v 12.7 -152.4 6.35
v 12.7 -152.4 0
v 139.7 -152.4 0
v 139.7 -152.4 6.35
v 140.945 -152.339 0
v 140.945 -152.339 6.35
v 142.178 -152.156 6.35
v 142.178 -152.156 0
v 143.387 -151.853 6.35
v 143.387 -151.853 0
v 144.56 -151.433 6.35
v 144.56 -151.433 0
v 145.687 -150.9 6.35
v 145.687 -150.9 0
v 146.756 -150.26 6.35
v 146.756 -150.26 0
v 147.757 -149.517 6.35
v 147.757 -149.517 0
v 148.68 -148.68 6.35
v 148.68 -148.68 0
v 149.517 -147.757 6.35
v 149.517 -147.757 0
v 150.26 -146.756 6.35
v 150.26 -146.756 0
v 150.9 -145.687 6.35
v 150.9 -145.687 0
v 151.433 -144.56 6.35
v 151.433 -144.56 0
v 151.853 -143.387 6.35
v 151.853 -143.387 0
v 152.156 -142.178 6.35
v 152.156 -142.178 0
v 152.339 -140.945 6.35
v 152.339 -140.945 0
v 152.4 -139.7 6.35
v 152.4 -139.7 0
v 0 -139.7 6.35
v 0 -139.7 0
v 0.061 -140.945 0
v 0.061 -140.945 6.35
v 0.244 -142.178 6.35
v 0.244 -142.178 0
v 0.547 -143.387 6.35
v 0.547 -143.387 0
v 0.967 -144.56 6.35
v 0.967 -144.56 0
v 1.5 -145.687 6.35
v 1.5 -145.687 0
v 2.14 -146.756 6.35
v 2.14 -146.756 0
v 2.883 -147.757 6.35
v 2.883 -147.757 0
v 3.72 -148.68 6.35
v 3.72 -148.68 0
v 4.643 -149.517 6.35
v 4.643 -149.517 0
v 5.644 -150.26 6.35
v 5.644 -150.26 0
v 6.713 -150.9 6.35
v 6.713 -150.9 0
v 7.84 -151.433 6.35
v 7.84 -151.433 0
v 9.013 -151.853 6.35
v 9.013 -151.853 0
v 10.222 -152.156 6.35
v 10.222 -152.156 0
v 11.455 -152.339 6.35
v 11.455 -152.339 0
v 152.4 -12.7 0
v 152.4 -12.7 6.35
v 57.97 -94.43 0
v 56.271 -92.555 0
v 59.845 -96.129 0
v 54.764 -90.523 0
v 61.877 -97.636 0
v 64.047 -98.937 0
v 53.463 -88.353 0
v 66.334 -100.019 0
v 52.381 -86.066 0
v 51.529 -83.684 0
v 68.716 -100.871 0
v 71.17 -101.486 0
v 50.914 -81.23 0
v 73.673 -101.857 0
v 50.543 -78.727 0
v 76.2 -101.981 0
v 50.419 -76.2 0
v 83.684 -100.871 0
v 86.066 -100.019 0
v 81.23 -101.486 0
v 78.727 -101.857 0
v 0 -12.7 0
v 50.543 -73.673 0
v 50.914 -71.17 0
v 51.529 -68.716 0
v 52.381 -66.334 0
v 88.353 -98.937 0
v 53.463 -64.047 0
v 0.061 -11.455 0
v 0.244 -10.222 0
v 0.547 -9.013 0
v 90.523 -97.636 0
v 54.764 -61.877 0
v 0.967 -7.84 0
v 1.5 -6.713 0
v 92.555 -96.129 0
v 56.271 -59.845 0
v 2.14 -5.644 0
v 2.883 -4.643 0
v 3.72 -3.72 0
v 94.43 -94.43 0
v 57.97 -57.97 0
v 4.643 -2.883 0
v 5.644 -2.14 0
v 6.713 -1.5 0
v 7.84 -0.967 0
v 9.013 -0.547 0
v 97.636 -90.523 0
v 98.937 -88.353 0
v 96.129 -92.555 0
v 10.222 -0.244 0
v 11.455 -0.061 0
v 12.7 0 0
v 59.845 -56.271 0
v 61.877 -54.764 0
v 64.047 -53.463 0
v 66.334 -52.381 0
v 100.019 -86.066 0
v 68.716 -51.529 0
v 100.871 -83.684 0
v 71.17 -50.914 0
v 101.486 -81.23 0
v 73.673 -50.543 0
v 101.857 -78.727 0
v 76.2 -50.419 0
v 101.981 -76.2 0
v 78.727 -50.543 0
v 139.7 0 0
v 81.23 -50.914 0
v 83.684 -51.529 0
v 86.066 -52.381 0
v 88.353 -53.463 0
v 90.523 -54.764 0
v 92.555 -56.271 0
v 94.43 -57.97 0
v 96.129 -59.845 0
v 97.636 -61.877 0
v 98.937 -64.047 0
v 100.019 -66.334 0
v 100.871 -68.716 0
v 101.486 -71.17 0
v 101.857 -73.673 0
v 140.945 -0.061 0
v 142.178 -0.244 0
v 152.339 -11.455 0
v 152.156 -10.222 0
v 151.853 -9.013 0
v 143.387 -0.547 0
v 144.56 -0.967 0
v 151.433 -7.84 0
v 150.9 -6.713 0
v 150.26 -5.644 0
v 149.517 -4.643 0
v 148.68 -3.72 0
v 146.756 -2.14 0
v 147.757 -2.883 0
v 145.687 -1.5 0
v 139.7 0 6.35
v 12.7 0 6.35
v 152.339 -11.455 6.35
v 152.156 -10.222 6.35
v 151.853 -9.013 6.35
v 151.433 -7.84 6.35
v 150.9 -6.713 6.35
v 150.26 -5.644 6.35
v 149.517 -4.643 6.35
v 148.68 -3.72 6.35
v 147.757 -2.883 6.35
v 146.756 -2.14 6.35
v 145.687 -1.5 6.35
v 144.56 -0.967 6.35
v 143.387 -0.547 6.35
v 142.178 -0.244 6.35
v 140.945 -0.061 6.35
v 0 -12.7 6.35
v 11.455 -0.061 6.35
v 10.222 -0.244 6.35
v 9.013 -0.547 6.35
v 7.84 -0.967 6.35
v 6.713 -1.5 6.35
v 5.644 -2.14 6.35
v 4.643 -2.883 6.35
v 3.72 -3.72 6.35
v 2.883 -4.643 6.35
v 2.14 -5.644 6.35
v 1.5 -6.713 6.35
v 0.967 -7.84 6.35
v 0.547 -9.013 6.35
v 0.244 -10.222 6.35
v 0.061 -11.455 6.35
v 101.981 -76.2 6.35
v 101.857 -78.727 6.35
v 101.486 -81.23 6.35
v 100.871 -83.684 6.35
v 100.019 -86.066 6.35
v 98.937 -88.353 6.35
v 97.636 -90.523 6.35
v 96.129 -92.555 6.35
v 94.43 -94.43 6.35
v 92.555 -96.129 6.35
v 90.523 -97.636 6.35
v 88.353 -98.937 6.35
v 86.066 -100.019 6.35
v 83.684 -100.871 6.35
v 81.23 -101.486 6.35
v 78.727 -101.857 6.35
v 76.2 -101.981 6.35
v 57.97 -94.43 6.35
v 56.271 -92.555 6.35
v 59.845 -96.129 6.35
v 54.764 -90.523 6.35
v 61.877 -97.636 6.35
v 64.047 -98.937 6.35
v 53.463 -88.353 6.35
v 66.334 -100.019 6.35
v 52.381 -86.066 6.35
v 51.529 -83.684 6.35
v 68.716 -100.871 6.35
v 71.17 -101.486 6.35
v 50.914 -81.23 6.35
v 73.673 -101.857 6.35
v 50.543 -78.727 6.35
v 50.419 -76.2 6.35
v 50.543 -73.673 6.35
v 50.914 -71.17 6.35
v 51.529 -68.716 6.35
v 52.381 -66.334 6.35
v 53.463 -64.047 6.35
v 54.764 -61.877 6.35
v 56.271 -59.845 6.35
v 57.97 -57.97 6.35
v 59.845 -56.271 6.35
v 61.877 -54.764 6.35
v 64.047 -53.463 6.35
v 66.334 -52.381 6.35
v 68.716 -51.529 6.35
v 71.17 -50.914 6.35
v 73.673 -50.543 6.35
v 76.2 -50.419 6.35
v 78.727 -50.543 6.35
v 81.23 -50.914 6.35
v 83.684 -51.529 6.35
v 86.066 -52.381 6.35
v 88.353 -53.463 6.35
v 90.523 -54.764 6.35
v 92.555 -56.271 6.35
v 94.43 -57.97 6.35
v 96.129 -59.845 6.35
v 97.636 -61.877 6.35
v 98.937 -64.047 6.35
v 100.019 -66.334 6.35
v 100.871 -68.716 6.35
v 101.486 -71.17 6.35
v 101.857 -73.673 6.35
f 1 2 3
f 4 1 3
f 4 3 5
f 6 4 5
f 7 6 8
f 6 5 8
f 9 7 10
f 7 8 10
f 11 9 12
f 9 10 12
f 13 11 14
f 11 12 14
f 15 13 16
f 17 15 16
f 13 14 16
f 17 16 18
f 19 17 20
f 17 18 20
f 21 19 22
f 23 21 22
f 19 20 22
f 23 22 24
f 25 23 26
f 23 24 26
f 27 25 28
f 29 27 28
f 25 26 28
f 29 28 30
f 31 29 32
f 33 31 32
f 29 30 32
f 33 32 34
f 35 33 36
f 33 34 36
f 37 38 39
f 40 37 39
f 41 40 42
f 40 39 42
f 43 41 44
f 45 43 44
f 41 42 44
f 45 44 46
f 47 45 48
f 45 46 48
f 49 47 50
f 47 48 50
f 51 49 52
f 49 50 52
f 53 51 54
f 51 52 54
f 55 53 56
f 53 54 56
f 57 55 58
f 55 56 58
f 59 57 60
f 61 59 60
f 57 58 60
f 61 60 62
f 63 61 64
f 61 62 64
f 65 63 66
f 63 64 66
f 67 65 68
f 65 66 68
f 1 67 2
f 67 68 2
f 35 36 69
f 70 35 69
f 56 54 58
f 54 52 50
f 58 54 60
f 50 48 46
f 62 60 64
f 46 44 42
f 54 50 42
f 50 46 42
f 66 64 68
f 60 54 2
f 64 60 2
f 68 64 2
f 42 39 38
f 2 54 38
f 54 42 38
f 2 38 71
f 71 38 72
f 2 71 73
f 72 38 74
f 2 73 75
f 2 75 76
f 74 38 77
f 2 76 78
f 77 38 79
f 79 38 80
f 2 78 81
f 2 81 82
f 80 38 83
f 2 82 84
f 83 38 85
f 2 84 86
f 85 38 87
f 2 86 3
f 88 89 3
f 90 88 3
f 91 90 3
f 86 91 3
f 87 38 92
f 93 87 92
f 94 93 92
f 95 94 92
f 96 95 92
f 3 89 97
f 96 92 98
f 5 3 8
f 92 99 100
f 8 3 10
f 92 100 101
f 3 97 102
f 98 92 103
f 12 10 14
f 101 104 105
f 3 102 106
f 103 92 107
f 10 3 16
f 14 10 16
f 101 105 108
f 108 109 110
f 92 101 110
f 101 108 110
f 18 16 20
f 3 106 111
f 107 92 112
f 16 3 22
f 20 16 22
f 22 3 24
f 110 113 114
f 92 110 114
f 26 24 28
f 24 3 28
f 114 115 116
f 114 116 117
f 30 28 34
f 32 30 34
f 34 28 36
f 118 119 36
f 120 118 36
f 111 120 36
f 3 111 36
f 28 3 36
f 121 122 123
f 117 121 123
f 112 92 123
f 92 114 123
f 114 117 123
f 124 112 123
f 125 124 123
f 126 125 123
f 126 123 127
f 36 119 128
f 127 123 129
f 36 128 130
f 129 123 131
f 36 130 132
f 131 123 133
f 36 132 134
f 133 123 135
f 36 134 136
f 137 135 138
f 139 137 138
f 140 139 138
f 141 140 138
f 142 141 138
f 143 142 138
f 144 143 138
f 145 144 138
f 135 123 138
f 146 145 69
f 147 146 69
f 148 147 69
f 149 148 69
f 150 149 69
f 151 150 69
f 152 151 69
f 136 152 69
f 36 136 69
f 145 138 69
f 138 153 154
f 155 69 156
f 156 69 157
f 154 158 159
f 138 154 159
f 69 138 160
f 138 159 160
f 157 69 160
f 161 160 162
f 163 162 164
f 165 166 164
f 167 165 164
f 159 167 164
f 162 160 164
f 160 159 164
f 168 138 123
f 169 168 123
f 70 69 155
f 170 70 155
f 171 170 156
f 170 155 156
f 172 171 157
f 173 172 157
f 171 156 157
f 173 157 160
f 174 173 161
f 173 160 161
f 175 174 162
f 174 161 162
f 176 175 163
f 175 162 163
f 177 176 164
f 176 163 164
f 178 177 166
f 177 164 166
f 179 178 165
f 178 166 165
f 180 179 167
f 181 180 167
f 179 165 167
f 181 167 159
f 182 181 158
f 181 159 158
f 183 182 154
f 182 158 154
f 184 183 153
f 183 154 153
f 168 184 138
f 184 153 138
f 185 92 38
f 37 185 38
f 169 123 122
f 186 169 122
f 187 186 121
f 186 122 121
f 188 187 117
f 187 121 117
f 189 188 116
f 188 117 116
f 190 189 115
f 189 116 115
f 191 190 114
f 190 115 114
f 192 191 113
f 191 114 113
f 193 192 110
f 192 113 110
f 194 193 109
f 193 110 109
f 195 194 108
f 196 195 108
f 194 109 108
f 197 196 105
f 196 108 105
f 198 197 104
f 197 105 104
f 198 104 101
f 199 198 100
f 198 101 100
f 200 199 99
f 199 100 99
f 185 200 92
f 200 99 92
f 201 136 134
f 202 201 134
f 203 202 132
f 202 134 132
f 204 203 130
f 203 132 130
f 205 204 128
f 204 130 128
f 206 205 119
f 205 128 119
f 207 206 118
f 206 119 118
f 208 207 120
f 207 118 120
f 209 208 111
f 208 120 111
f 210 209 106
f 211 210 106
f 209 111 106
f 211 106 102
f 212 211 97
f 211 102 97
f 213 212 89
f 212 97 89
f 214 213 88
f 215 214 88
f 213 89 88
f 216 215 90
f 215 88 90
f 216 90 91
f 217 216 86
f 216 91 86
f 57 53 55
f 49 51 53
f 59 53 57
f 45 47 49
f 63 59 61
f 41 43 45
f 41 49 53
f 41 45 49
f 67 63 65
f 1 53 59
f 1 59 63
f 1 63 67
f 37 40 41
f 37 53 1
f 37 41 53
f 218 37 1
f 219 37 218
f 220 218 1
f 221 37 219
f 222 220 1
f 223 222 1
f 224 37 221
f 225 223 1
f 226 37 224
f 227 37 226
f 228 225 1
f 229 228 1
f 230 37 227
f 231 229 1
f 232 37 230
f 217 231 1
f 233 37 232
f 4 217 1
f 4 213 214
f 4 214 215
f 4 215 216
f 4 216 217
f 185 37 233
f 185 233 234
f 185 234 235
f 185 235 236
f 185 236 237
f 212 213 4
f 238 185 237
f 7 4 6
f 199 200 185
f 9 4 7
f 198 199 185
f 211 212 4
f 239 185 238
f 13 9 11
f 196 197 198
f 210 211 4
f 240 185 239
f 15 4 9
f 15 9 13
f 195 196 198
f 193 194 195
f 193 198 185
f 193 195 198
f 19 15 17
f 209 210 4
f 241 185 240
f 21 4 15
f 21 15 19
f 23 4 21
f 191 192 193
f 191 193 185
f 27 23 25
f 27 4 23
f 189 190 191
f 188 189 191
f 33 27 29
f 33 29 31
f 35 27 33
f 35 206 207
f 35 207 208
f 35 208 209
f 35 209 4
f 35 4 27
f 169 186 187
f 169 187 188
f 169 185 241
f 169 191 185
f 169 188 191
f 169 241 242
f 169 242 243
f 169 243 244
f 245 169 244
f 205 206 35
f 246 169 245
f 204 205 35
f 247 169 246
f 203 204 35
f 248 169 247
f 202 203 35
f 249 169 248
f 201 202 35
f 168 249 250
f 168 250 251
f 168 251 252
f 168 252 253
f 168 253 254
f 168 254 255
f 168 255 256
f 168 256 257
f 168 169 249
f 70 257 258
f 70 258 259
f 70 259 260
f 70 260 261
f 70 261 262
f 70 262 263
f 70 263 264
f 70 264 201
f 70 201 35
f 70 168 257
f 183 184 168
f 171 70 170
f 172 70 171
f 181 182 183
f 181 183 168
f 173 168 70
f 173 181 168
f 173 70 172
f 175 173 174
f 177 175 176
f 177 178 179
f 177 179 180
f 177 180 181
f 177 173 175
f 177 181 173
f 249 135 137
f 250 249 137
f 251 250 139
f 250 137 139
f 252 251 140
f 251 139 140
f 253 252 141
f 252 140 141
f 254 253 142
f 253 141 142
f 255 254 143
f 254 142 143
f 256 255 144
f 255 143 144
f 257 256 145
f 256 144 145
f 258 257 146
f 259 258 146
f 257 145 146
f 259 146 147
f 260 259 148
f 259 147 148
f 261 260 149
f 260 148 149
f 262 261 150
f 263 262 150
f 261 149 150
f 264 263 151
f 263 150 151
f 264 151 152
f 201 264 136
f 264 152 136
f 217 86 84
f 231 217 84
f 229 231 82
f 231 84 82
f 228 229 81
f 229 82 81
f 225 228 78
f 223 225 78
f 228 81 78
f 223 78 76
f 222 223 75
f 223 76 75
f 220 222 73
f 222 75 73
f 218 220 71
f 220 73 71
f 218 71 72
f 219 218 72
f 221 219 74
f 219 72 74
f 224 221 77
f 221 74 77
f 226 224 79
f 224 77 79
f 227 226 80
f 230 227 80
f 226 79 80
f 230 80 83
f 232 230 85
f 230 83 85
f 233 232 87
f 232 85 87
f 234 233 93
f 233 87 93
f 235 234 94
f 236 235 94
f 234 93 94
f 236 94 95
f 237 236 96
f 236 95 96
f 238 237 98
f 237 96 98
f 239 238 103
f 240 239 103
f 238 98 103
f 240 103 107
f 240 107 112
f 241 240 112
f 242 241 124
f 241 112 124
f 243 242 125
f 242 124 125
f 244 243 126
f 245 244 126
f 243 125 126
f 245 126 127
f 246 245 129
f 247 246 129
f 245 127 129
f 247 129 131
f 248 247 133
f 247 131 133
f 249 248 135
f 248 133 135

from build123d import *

# Parameters (mm, degrees)
F1_DEPTH = 6.35


with BuildPart() as f1:
    # F0 (on Top) → F1 (new body)
    with BuildSketch(Plane.XY):
        with BuildLine():
            Line((76.2, 0), (12.7, 0))
            ThreePointArc((12.7, 0), (3.719744, -3.719744), (0, -12.7))
            Line((0, -12.7), (0, -139.7))
            ThreePointArc((0, -139.7), (3.719744, -148.680256), (12.7, -152.4))
            Line((12.7, -152.4), (76.2, -152.4))
            Line((76.2, -152.4), (76.2, -101.981))
            ThreePointArc((76.2, -101.981), (50.419, -76.2), (76.2, -50.419))
            Line((76.2, -50.419), (76.2, 0))
        make_face()
        with BuildLine():
            Line((139.7, 0), (76.2, 0))
            Line((76.2, 0), (76.2, -50.419))
            ThreePointArc((76.2, -50.419), (94.42992, -57.97008), (101.981, -76.2))
            ThreePointArc((101.981, -76.2), (94.42992, -94.42992), (76.2, -101.981))
            Line((76.2, -101.981), (76.2, -152.4))
            Line((76.2, -152.4), (139.7, -152.4))
            ThreePointArc((139.7, -152.4), (148.680256, -148.680256), (152.4, -139.7))
            Line((152.4, -139.7), (152.4, -12.7))
            ThreePointArc((152.4, -12.7), (148.680256, -3.719744), (139.7, 0))
        make_face()
    extrude(amount=F1_DEPTH)


solid = f1.part
